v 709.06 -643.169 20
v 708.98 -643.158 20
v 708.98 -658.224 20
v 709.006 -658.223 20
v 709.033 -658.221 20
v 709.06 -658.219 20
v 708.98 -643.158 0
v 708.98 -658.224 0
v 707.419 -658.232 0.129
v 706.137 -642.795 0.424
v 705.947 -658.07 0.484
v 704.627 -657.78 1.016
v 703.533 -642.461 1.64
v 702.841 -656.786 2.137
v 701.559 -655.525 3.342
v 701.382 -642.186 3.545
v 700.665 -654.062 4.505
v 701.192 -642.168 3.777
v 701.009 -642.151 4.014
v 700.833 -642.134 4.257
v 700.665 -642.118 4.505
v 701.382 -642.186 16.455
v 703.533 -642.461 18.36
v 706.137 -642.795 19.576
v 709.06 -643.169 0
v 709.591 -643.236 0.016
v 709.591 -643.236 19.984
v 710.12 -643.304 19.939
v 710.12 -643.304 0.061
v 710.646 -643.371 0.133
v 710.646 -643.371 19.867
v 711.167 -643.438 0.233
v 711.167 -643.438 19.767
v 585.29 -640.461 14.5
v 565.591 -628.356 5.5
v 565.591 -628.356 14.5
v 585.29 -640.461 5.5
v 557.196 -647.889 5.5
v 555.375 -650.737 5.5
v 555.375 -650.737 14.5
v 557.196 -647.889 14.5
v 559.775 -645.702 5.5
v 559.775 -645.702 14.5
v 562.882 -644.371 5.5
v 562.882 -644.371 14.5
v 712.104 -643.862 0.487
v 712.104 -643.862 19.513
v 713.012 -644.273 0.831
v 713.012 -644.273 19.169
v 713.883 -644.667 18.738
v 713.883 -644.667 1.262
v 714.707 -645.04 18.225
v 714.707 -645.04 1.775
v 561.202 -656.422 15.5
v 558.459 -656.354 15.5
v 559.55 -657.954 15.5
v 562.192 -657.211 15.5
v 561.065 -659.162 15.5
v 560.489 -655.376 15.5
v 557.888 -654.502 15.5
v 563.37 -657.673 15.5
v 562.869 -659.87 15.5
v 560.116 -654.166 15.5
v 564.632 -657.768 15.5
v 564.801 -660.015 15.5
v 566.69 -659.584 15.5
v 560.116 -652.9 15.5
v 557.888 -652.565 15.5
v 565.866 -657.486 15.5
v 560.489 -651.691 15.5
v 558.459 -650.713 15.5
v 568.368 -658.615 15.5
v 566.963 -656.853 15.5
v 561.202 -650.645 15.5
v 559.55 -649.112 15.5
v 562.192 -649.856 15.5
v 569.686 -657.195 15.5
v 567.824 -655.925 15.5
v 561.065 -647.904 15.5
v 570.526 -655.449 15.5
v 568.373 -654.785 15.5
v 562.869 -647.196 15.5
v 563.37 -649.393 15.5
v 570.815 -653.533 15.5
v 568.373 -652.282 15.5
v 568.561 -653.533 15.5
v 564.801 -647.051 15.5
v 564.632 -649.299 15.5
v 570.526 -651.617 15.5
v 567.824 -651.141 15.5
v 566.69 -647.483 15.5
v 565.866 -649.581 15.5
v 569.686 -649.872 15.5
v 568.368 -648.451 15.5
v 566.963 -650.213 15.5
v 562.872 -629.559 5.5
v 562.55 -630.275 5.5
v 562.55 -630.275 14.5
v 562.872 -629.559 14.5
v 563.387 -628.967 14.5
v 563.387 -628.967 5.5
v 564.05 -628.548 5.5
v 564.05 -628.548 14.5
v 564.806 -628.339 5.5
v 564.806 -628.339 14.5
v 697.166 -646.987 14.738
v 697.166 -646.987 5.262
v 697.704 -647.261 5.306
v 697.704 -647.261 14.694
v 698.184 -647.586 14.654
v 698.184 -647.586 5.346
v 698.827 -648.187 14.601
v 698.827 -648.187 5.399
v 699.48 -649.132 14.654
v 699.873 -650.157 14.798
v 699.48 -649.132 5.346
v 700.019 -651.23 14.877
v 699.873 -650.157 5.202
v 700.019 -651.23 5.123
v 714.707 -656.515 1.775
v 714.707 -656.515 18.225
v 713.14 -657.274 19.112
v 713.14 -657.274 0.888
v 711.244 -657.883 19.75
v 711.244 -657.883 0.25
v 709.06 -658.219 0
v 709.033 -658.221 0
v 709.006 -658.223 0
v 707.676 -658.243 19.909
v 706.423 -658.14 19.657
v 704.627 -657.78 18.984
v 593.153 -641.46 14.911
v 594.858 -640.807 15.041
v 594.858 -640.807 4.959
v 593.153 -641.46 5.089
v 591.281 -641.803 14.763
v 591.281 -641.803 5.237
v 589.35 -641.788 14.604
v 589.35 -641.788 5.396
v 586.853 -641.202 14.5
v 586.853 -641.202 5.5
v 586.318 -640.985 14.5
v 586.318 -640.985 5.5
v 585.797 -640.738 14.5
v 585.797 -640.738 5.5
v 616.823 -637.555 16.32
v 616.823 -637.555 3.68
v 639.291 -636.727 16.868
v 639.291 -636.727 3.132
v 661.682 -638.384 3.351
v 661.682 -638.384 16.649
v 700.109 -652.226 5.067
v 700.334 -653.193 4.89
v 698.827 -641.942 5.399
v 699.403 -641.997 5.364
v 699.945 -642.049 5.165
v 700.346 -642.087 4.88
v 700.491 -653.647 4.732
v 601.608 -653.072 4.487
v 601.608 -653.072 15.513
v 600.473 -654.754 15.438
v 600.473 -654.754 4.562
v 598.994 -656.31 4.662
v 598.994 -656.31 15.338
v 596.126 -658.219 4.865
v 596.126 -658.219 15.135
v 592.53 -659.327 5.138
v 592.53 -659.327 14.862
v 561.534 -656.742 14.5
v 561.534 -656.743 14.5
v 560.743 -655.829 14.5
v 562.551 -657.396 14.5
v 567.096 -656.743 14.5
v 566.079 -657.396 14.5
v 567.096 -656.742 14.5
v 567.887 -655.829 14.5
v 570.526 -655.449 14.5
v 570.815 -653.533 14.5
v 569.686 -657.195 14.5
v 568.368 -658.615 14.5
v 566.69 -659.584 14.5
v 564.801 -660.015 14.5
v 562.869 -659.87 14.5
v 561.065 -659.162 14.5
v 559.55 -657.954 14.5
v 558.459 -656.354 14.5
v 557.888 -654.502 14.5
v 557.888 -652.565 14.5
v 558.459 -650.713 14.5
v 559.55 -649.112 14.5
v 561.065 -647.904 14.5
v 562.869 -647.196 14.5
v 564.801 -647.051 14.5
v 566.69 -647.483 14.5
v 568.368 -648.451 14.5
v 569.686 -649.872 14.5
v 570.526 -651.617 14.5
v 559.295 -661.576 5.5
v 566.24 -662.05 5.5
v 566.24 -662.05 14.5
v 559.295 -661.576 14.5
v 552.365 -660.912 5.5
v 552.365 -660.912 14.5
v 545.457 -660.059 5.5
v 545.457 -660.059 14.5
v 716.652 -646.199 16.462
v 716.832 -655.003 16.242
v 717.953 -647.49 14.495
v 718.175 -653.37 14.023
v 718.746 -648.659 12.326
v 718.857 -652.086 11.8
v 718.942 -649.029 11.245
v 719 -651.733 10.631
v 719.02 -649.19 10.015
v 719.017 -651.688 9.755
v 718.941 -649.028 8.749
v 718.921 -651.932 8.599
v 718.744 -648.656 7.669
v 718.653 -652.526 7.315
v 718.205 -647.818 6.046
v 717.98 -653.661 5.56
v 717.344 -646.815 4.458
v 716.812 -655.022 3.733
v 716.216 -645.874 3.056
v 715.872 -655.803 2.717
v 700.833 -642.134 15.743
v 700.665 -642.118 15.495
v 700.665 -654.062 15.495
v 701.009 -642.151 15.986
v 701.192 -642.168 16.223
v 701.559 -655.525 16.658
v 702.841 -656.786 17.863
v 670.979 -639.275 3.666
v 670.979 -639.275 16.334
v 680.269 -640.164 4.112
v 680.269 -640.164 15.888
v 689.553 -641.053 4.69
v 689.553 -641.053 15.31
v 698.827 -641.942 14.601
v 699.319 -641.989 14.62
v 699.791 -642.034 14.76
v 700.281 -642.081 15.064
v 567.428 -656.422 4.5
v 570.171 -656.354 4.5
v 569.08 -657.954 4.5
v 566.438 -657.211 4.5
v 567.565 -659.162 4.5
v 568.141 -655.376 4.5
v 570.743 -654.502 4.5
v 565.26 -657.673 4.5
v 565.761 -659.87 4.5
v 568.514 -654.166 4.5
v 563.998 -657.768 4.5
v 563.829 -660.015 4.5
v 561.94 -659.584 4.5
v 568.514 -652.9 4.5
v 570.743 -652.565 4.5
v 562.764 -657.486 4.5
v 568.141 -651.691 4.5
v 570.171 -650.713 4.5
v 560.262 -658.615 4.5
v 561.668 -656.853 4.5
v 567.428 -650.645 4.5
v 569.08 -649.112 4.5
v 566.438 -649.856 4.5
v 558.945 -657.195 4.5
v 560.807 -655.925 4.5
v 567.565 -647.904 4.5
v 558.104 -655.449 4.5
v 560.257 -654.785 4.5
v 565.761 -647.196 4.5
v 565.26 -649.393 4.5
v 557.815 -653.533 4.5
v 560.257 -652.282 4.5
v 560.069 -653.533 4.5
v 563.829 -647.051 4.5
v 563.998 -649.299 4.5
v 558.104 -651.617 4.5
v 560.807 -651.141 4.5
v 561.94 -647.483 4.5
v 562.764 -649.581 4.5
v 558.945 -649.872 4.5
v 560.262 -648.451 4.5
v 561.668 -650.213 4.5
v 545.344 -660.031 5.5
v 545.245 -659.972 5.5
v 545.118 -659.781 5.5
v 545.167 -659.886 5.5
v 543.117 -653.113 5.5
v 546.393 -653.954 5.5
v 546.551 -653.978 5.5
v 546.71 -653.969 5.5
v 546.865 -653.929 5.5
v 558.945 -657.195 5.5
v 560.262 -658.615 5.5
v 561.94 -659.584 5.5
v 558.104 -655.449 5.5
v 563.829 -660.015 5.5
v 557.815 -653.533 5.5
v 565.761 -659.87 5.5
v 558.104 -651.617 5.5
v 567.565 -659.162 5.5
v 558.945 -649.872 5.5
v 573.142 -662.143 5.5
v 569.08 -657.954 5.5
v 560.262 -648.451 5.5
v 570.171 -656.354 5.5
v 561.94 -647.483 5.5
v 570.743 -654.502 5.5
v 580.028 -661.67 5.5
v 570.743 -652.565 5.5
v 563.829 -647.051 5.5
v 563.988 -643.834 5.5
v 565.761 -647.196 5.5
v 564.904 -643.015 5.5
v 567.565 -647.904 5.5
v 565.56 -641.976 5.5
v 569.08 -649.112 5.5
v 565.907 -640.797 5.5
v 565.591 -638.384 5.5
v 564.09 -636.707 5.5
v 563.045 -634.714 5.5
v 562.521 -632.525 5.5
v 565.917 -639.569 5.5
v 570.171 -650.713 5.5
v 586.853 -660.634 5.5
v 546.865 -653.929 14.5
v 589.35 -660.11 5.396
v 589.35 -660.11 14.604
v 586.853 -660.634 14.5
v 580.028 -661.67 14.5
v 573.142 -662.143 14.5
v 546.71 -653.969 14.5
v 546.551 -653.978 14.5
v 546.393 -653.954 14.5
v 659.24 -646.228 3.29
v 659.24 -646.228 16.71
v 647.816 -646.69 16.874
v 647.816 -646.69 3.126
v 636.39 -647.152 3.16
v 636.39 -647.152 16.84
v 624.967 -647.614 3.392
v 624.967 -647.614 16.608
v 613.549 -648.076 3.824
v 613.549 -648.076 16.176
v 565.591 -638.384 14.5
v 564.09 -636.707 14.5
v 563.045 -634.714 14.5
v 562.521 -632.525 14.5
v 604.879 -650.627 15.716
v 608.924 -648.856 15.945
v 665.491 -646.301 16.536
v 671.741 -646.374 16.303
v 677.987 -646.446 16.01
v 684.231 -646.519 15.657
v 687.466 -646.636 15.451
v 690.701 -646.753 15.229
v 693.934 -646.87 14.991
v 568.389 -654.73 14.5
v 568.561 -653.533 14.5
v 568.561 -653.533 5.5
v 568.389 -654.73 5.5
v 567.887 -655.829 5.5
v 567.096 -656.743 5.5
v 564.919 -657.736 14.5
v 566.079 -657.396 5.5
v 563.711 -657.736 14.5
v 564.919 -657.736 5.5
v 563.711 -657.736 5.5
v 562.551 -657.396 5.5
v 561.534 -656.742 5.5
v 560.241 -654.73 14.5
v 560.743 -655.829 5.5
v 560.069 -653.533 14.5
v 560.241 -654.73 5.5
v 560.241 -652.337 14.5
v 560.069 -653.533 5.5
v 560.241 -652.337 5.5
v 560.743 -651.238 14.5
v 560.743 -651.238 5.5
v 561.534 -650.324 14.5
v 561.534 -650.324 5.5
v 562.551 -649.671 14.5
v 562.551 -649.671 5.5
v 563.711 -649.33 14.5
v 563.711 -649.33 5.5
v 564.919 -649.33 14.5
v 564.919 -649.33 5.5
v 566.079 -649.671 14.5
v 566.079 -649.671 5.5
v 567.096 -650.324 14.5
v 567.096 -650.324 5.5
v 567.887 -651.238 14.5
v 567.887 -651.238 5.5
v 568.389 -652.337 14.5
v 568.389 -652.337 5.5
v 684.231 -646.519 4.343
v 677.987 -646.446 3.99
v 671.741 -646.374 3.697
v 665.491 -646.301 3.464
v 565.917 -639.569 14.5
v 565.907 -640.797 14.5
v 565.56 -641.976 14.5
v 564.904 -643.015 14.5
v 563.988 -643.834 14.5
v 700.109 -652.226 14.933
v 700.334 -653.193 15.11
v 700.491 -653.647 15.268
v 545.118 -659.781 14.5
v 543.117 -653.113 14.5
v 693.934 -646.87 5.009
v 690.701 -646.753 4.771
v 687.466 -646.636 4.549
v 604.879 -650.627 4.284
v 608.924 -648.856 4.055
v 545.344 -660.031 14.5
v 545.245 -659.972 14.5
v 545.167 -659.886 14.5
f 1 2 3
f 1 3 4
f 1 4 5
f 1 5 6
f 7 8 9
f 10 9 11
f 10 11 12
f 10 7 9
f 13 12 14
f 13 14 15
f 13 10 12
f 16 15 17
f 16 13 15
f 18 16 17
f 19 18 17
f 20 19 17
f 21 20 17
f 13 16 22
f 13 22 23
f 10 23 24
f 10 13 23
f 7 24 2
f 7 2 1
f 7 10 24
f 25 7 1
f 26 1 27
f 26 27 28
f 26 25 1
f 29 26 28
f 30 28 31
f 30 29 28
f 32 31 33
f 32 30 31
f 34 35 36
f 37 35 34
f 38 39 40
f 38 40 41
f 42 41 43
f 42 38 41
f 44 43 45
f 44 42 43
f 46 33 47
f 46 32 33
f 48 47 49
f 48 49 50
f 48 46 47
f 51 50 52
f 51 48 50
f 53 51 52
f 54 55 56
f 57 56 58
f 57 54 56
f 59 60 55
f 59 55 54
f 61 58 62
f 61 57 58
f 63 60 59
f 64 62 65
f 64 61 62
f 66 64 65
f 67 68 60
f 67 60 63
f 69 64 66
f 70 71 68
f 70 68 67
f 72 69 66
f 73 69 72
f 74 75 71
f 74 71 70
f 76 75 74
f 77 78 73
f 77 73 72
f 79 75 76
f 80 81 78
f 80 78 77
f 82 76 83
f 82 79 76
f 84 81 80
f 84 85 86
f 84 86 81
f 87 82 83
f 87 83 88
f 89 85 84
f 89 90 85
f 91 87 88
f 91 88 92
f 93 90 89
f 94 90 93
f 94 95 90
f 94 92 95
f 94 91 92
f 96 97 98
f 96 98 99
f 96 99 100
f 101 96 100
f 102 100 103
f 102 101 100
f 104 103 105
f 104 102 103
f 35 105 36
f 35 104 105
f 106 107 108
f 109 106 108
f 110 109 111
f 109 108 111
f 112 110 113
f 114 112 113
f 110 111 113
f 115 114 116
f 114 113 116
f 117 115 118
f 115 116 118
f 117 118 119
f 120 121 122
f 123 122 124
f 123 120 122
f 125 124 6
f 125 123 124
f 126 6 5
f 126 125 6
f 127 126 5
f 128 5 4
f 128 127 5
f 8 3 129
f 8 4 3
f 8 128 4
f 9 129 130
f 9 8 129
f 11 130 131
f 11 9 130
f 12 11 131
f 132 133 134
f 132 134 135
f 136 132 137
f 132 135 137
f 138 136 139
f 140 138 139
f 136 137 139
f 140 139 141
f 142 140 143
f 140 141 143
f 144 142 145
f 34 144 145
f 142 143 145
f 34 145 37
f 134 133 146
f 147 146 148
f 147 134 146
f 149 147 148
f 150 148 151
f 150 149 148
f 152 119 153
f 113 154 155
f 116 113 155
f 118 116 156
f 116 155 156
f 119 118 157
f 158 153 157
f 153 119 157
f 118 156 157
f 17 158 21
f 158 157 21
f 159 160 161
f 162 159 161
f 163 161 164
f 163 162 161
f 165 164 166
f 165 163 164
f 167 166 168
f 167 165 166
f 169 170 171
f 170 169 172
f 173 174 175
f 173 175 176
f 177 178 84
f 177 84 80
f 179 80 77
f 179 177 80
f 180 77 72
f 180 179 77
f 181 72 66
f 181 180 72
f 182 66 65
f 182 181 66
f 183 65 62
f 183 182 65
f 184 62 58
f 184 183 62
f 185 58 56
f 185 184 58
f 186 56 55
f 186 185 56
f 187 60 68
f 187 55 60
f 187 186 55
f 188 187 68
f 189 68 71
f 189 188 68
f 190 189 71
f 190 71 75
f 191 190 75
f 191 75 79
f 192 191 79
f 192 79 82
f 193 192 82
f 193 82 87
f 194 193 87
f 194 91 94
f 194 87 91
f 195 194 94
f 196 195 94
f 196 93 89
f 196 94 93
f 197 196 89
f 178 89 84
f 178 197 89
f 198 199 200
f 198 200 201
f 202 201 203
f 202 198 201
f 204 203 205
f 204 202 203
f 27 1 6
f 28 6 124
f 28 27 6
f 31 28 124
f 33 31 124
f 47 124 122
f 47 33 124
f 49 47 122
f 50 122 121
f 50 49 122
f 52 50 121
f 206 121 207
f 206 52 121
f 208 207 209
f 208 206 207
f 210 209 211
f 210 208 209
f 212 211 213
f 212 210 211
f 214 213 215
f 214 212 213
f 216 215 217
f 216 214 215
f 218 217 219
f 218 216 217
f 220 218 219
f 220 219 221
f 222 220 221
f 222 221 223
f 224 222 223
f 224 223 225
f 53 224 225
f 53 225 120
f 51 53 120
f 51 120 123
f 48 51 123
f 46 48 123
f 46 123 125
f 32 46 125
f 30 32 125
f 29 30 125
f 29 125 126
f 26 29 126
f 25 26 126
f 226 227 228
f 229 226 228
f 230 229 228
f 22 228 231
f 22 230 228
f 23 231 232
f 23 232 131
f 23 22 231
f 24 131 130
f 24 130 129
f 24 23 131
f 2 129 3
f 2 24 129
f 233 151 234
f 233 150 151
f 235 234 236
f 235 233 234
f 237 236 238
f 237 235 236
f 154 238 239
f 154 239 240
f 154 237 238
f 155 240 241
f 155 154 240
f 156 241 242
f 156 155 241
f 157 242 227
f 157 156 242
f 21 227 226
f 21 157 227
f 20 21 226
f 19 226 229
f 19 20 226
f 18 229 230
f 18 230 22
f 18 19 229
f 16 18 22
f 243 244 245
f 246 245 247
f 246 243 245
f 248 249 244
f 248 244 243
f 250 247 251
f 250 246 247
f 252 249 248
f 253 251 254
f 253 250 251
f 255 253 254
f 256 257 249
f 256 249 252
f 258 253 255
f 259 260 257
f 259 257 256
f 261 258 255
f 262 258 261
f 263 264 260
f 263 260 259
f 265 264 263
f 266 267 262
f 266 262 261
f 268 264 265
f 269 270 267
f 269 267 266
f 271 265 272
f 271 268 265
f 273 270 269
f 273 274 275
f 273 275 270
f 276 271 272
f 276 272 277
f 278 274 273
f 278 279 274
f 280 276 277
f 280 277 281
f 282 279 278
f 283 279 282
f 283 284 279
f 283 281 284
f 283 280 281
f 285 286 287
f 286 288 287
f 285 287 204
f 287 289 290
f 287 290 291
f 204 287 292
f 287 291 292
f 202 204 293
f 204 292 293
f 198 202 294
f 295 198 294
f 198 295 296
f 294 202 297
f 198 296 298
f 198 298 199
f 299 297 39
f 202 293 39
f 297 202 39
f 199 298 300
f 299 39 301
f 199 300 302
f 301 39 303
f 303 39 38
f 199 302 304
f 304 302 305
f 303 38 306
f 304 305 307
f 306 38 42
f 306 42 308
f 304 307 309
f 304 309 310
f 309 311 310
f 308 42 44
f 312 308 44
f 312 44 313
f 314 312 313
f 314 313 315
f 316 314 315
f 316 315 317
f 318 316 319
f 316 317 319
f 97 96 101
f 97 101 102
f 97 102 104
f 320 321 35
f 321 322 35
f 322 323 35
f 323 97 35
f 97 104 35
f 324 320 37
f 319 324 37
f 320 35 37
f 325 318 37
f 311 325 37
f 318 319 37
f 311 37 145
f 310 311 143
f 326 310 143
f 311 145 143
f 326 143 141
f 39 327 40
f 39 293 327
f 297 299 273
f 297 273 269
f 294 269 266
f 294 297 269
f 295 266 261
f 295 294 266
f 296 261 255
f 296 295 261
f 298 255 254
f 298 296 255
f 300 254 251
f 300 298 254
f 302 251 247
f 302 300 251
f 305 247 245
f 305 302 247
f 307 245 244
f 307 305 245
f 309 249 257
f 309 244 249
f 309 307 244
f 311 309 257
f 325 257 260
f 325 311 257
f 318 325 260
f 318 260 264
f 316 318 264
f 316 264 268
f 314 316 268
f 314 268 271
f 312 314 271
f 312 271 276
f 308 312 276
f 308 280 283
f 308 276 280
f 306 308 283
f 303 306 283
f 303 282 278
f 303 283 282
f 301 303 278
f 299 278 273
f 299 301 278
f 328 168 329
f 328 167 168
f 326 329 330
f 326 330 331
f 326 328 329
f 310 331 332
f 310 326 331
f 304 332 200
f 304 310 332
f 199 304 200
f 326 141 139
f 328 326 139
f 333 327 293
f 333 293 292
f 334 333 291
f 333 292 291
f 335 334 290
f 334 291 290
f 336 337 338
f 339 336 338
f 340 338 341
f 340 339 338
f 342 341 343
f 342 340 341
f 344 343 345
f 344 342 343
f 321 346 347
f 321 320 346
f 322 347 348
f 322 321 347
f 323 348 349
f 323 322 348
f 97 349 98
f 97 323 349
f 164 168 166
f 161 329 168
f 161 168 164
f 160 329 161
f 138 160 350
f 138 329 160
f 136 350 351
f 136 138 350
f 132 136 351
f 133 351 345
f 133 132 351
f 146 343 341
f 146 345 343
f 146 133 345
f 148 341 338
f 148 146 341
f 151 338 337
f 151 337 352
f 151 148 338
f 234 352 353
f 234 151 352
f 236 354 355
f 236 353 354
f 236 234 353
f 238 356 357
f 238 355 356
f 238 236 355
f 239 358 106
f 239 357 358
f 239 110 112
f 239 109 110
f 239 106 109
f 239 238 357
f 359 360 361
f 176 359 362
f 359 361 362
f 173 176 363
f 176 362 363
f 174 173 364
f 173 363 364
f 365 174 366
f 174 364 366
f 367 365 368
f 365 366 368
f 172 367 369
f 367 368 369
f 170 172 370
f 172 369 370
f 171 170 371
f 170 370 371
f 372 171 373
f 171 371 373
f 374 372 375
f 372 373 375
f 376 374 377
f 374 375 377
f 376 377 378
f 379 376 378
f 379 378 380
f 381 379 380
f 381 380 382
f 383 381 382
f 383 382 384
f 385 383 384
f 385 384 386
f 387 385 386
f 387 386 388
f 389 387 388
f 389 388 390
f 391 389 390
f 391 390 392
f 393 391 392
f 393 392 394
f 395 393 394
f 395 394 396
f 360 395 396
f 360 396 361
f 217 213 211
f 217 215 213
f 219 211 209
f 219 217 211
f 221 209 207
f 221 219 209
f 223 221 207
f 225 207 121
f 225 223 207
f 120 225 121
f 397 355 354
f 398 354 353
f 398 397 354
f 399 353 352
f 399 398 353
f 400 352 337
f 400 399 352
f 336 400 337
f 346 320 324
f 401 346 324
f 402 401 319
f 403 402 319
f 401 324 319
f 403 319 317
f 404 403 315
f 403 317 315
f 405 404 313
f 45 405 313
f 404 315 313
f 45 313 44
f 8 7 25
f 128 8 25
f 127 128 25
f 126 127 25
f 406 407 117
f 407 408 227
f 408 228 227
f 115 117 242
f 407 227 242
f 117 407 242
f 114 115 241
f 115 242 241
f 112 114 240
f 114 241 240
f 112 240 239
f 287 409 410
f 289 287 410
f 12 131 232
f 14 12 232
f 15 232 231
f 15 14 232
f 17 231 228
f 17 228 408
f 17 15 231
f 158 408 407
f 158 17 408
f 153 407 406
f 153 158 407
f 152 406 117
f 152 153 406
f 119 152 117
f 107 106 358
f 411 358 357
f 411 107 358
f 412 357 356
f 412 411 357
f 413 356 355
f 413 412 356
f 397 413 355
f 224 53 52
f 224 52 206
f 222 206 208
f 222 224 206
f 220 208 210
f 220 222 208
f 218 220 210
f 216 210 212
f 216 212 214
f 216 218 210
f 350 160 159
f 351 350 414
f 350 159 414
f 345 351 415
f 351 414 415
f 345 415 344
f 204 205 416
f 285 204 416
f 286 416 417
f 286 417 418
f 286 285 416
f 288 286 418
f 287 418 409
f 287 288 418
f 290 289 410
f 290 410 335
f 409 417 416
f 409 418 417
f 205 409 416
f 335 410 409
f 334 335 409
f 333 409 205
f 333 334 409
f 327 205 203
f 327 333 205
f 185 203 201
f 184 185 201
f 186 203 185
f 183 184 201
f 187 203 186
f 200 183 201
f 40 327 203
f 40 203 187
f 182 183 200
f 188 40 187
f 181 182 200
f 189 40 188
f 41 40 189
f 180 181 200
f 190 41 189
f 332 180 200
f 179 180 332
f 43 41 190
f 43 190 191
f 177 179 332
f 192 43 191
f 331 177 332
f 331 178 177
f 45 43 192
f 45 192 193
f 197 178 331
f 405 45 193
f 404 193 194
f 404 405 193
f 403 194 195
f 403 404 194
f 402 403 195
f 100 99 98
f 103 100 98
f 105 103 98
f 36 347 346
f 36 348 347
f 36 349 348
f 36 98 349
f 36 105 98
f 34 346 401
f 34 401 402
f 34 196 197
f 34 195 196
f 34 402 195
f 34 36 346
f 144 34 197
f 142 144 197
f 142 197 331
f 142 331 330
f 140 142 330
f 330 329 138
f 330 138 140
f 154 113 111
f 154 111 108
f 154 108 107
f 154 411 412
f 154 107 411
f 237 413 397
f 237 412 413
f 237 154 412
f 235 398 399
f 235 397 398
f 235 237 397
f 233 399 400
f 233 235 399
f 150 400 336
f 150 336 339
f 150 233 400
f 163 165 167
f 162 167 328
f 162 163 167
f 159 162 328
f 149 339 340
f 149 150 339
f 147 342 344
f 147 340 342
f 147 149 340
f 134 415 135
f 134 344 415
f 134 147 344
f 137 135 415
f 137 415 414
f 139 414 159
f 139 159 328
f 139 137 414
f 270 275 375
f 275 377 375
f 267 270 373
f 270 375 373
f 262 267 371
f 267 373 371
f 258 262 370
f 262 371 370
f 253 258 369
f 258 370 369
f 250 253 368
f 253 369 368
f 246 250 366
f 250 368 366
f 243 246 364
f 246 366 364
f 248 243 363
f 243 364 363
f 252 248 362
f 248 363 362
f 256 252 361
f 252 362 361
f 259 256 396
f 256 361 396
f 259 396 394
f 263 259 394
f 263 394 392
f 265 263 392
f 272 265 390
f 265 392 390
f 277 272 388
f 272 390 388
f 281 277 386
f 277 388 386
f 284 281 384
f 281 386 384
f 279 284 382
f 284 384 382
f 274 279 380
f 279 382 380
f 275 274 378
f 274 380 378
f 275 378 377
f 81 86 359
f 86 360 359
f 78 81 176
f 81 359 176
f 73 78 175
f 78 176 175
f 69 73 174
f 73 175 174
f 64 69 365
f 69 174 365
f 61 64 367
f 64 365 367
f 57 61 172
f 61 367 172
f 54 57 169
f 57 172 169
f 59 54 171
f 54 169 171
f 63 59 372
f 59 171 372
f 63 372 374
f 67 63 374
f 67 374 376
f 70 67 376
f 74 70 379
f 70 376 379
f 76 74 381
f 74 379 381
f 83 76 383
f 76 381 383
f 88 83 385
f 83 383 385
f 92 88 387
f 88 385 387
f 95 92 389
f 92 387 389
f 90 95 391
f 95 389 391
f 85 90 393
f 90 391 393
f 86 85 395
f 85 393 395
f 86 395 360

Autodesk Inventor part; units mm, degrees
ref_plane "YZ Plane" through (0, 0, 0) normal (1, 0, 0) x (0, 1, 0)
ref_plane "XZ Plane" through (0, 0, 0) normal (0, 1, 0) x (-1, 0, 0)
ref_plane "XY Plane" through (0, 0, 0) normal (0, 0, 1) x (1, 0, 0)
sketch "Sketch1" plane through (0, 0, 0) normal (0, 0, 1) x (1, 0, 0)
  line L0 (545.1177, -659.7811) -> (543.1172, -653.1128)
  line L1 (543.1172, -653.1128) -> (546.3933, -653.954)
  line L2 (546.8648, -653.9286) -> (555.3753, -650.7372)
  line L3 (565.5906, -628.3557) -> (585.29, -640.4612)
  line L4 (661.6824, -638.3842) -> (701.382, -642.1863)
  line L5 (701.382, -642.1863) -> (711.1668, -643.438)
  line L6 (711.1668, -643.438) -> (714.7071, -645.0396)
  line L7 (697.1659, -646.9866) -> (684.2309, -646.5188)
  line L8 (684.2309, -646.5188) -> (659.2401, -646.2281)
  line L9 (659.2401, -646.2281) -> (613.5494, -648.0763)
  arc A0 (545.1177, -659.7811) -> (545.4566, -660.0594) centre (545.4941, -659.6682) ccw
  arc A1 (546.3933, -653.954) -> (546.8648, -653.9286) centre (546.5888, -653.1927) ccw
  arc A2 (562.8823, -644.3706) -> (555.3753, -650.7372) centre (565.7536, -655.3653) ccw
  arc A3 (562.8823, -644.3706) -> (565.5906, -638.384) centre (561.5138, -640.1457) ccw
  arc A4 (562.5496, -630.2746) -> (565.5906, -638.384) centre (571.5807, -631.5129) ccw
  arc A5 (565.5906, -628.3557) -> (562.5496, -630.2746) centre (565.1403, -631.0112) ccw
  arc A6 (585.29, -640.4612) -> (594.8583, -640.8073) centre (590.3971, -631.706) ccw
  arc A7 (661.6824, -638.3842) -> (594.8583, -640.8073) centre (635.5259, -839.6851) ccw
  arc A8 (719.4278, -650.2259) -> (714.7071, -645.0396) centre (711.4064, -652.7856) ccw
  arc A9 (714.7071, -656.5151) -> (719.4278, -650.2259) centre (710.637, -648.5438) ccw
  arc A10 (704.6273, -657.7797) -> (714.7071, -656.5151) centre (708.1369, -644.9496) ccw
  arc A11 (700.0188, -651.2301) -> (704.6273, -657.7797) centre (707.1824, -651.0857) ccw
  arc A12 (700.0188, -651.2301) -> (697.1659, -646.9866) centre (695.2949, -651.3253) ccw
  arc A13 (613.5494, -648.0763) -> (601.6075, -653.0719) centre (614.3004, -666.6428) ccw
  arc A14 (592.5304, -659.3266) -> (601.6075, -653.0719) centre (590.6768, -646.9227) ccw
  arc A15 (566.2399, -662.0499) -> (592.5304, -659.3266) centre (570.8255, -578.0544) ccw
  arc A16 (545.4566, -660.0594) -> (566.2399, -662.0499) centre (580.1428, -407.3877) ccw
  circle A17 centre (564.3151, -653.5334) radius 4.2463
  point P0 (0, 0)
  dimension "d30" = 0.393
  dimension "d31" = 0.786
extrude "Extrusion1" add sketch "Sketch1" along normal blind 20
sketch "Sketch2" plane through (0, 0, 0) normal (0, 1, 0) x (-1, 0, 0)
  line L0 (-543.1172, 0) -> (-543.1172, 20) projected
  line L1 (-700.0198, 5.5) -> (-700.0198, 14.5)
  line L2 (-543.1172, 5.5) -> (-543.1172, 14.5)
  line L3 (-700.0198, 10) -> (-543.1172, 10) construction
  line L4 (-621.5685, 10) -> (-621.5685, 3.5) construction
  line L5 (-543.1172, 5.5) -> (-586.8527, 5.5)
  arc A0 (-698.8271, 5.3992) -> (-589.3495, 5.3959) centre (-644.0685, 660.5736) ccw
  arc A1 (-586.8527, 5.5) -> (-589.3495, 5.3959) centre (-586.8527, -24.5) ccw
  line L6 (-543.1172, 14.5) -> (-586.8527, 14.5)
  arc A2 (-589.3495, 14.6041) -> (-698.8271, 14.6008) centre (-644.0685, -640.5736) ccw
  arc A3 (-589.3495, 14.6041) -> (-586.8527, 14.5) centre (-586.8527, 44.5) ccw
  line L7 (-527.985, -16.5873) -> (-734.4622, -16.5873)
  line L8 (-734.4622, -16.5873) -> (-734.4622, 28.3783)
  line L9 (-734.4622, 28.3783) -> (-527.985, 28.3783)
  line L10 (-527.985, 28.3783) -> (-527.985, -16.5873)
  arc A4 (-700.6647, 15.4949) -> (-700.6647, 4.5051) centre (-709.0198, 10) ccw
  arc A5 (-698.8271, 5.3992) -> (-700.6647, 4.5051) centre (-698.9937, 3.4062) ccw
  arc A6 (-700.6647, 15.4949) -> (-698.8271, 14.6008) centre (-698.9937, 16.5938) ccw
  point P0 (0, 0)
  point P1 (0, 0)
  point P2 (0, 0)
  point P3 (-588.1172, 5.5)
  dimension "d42" = 9
  dimension "d43" = 9
  dimension "d45" = 6.5
  dimension "d46" = 45
  dimension "d47" = 30
  dimension "d48" = 20
  dimension "d49" = 9
  dimension "d50" = 2
extrude "Extrusion2" cut sketch "Sketch2" against normal through all
sketch "Sketch3" plane through (586.8527, -660.634, 14.5) normal (0, 0, 1) x (1, 0, 0)
  circle A0 centre (-22.5376, 7.1007) radius 4.2463 projected
  circle A1 centre (-22.5376, 7.1007) radius 6.5
  point P0 (-586.8527, 660.634)
  dimension "d53" = 13
extrude "Extrusion3" add sketch "Sketch3" along normal blind 1
sketch "Sketch4" plane through (586.8527, -660.634, 5.5) normal (0, 0, -1) x (-1, 0, 0)
  circle A0 centre (22.5376, 7.1007) radius 4.2463 projected
  circle A1 centre (22.5376, 7.1007) radius 6.5
  point P0 (586.8527, 660.634)
  dimension "d56" = 13
extrude "Extrusion4" add sketch "Sketch4" along normal blind 1
sketch "Sketch5" plane through (586.8527, -660.634, 5.5) normal (0, 0, -1) x (-1, 0, 0)
  line L0 (43.7354, 7.5213) -> (41.735, 0.8529) projected
  line L1 (0, 19.4321) -> (0, 0) projected
  line L2 (43.7354, 7.5213) -> (53.7354, 7.5213)
  line L3 (53.7354, 7.5213) -> (41.735, 0.8529)
  point P0 (586.8527, 660.634)
  dimension "d59" = 10
extrude "Extrusion5" [suppressed]
fillet "Fillet1" [suppressed]
properties part number "MAN"
